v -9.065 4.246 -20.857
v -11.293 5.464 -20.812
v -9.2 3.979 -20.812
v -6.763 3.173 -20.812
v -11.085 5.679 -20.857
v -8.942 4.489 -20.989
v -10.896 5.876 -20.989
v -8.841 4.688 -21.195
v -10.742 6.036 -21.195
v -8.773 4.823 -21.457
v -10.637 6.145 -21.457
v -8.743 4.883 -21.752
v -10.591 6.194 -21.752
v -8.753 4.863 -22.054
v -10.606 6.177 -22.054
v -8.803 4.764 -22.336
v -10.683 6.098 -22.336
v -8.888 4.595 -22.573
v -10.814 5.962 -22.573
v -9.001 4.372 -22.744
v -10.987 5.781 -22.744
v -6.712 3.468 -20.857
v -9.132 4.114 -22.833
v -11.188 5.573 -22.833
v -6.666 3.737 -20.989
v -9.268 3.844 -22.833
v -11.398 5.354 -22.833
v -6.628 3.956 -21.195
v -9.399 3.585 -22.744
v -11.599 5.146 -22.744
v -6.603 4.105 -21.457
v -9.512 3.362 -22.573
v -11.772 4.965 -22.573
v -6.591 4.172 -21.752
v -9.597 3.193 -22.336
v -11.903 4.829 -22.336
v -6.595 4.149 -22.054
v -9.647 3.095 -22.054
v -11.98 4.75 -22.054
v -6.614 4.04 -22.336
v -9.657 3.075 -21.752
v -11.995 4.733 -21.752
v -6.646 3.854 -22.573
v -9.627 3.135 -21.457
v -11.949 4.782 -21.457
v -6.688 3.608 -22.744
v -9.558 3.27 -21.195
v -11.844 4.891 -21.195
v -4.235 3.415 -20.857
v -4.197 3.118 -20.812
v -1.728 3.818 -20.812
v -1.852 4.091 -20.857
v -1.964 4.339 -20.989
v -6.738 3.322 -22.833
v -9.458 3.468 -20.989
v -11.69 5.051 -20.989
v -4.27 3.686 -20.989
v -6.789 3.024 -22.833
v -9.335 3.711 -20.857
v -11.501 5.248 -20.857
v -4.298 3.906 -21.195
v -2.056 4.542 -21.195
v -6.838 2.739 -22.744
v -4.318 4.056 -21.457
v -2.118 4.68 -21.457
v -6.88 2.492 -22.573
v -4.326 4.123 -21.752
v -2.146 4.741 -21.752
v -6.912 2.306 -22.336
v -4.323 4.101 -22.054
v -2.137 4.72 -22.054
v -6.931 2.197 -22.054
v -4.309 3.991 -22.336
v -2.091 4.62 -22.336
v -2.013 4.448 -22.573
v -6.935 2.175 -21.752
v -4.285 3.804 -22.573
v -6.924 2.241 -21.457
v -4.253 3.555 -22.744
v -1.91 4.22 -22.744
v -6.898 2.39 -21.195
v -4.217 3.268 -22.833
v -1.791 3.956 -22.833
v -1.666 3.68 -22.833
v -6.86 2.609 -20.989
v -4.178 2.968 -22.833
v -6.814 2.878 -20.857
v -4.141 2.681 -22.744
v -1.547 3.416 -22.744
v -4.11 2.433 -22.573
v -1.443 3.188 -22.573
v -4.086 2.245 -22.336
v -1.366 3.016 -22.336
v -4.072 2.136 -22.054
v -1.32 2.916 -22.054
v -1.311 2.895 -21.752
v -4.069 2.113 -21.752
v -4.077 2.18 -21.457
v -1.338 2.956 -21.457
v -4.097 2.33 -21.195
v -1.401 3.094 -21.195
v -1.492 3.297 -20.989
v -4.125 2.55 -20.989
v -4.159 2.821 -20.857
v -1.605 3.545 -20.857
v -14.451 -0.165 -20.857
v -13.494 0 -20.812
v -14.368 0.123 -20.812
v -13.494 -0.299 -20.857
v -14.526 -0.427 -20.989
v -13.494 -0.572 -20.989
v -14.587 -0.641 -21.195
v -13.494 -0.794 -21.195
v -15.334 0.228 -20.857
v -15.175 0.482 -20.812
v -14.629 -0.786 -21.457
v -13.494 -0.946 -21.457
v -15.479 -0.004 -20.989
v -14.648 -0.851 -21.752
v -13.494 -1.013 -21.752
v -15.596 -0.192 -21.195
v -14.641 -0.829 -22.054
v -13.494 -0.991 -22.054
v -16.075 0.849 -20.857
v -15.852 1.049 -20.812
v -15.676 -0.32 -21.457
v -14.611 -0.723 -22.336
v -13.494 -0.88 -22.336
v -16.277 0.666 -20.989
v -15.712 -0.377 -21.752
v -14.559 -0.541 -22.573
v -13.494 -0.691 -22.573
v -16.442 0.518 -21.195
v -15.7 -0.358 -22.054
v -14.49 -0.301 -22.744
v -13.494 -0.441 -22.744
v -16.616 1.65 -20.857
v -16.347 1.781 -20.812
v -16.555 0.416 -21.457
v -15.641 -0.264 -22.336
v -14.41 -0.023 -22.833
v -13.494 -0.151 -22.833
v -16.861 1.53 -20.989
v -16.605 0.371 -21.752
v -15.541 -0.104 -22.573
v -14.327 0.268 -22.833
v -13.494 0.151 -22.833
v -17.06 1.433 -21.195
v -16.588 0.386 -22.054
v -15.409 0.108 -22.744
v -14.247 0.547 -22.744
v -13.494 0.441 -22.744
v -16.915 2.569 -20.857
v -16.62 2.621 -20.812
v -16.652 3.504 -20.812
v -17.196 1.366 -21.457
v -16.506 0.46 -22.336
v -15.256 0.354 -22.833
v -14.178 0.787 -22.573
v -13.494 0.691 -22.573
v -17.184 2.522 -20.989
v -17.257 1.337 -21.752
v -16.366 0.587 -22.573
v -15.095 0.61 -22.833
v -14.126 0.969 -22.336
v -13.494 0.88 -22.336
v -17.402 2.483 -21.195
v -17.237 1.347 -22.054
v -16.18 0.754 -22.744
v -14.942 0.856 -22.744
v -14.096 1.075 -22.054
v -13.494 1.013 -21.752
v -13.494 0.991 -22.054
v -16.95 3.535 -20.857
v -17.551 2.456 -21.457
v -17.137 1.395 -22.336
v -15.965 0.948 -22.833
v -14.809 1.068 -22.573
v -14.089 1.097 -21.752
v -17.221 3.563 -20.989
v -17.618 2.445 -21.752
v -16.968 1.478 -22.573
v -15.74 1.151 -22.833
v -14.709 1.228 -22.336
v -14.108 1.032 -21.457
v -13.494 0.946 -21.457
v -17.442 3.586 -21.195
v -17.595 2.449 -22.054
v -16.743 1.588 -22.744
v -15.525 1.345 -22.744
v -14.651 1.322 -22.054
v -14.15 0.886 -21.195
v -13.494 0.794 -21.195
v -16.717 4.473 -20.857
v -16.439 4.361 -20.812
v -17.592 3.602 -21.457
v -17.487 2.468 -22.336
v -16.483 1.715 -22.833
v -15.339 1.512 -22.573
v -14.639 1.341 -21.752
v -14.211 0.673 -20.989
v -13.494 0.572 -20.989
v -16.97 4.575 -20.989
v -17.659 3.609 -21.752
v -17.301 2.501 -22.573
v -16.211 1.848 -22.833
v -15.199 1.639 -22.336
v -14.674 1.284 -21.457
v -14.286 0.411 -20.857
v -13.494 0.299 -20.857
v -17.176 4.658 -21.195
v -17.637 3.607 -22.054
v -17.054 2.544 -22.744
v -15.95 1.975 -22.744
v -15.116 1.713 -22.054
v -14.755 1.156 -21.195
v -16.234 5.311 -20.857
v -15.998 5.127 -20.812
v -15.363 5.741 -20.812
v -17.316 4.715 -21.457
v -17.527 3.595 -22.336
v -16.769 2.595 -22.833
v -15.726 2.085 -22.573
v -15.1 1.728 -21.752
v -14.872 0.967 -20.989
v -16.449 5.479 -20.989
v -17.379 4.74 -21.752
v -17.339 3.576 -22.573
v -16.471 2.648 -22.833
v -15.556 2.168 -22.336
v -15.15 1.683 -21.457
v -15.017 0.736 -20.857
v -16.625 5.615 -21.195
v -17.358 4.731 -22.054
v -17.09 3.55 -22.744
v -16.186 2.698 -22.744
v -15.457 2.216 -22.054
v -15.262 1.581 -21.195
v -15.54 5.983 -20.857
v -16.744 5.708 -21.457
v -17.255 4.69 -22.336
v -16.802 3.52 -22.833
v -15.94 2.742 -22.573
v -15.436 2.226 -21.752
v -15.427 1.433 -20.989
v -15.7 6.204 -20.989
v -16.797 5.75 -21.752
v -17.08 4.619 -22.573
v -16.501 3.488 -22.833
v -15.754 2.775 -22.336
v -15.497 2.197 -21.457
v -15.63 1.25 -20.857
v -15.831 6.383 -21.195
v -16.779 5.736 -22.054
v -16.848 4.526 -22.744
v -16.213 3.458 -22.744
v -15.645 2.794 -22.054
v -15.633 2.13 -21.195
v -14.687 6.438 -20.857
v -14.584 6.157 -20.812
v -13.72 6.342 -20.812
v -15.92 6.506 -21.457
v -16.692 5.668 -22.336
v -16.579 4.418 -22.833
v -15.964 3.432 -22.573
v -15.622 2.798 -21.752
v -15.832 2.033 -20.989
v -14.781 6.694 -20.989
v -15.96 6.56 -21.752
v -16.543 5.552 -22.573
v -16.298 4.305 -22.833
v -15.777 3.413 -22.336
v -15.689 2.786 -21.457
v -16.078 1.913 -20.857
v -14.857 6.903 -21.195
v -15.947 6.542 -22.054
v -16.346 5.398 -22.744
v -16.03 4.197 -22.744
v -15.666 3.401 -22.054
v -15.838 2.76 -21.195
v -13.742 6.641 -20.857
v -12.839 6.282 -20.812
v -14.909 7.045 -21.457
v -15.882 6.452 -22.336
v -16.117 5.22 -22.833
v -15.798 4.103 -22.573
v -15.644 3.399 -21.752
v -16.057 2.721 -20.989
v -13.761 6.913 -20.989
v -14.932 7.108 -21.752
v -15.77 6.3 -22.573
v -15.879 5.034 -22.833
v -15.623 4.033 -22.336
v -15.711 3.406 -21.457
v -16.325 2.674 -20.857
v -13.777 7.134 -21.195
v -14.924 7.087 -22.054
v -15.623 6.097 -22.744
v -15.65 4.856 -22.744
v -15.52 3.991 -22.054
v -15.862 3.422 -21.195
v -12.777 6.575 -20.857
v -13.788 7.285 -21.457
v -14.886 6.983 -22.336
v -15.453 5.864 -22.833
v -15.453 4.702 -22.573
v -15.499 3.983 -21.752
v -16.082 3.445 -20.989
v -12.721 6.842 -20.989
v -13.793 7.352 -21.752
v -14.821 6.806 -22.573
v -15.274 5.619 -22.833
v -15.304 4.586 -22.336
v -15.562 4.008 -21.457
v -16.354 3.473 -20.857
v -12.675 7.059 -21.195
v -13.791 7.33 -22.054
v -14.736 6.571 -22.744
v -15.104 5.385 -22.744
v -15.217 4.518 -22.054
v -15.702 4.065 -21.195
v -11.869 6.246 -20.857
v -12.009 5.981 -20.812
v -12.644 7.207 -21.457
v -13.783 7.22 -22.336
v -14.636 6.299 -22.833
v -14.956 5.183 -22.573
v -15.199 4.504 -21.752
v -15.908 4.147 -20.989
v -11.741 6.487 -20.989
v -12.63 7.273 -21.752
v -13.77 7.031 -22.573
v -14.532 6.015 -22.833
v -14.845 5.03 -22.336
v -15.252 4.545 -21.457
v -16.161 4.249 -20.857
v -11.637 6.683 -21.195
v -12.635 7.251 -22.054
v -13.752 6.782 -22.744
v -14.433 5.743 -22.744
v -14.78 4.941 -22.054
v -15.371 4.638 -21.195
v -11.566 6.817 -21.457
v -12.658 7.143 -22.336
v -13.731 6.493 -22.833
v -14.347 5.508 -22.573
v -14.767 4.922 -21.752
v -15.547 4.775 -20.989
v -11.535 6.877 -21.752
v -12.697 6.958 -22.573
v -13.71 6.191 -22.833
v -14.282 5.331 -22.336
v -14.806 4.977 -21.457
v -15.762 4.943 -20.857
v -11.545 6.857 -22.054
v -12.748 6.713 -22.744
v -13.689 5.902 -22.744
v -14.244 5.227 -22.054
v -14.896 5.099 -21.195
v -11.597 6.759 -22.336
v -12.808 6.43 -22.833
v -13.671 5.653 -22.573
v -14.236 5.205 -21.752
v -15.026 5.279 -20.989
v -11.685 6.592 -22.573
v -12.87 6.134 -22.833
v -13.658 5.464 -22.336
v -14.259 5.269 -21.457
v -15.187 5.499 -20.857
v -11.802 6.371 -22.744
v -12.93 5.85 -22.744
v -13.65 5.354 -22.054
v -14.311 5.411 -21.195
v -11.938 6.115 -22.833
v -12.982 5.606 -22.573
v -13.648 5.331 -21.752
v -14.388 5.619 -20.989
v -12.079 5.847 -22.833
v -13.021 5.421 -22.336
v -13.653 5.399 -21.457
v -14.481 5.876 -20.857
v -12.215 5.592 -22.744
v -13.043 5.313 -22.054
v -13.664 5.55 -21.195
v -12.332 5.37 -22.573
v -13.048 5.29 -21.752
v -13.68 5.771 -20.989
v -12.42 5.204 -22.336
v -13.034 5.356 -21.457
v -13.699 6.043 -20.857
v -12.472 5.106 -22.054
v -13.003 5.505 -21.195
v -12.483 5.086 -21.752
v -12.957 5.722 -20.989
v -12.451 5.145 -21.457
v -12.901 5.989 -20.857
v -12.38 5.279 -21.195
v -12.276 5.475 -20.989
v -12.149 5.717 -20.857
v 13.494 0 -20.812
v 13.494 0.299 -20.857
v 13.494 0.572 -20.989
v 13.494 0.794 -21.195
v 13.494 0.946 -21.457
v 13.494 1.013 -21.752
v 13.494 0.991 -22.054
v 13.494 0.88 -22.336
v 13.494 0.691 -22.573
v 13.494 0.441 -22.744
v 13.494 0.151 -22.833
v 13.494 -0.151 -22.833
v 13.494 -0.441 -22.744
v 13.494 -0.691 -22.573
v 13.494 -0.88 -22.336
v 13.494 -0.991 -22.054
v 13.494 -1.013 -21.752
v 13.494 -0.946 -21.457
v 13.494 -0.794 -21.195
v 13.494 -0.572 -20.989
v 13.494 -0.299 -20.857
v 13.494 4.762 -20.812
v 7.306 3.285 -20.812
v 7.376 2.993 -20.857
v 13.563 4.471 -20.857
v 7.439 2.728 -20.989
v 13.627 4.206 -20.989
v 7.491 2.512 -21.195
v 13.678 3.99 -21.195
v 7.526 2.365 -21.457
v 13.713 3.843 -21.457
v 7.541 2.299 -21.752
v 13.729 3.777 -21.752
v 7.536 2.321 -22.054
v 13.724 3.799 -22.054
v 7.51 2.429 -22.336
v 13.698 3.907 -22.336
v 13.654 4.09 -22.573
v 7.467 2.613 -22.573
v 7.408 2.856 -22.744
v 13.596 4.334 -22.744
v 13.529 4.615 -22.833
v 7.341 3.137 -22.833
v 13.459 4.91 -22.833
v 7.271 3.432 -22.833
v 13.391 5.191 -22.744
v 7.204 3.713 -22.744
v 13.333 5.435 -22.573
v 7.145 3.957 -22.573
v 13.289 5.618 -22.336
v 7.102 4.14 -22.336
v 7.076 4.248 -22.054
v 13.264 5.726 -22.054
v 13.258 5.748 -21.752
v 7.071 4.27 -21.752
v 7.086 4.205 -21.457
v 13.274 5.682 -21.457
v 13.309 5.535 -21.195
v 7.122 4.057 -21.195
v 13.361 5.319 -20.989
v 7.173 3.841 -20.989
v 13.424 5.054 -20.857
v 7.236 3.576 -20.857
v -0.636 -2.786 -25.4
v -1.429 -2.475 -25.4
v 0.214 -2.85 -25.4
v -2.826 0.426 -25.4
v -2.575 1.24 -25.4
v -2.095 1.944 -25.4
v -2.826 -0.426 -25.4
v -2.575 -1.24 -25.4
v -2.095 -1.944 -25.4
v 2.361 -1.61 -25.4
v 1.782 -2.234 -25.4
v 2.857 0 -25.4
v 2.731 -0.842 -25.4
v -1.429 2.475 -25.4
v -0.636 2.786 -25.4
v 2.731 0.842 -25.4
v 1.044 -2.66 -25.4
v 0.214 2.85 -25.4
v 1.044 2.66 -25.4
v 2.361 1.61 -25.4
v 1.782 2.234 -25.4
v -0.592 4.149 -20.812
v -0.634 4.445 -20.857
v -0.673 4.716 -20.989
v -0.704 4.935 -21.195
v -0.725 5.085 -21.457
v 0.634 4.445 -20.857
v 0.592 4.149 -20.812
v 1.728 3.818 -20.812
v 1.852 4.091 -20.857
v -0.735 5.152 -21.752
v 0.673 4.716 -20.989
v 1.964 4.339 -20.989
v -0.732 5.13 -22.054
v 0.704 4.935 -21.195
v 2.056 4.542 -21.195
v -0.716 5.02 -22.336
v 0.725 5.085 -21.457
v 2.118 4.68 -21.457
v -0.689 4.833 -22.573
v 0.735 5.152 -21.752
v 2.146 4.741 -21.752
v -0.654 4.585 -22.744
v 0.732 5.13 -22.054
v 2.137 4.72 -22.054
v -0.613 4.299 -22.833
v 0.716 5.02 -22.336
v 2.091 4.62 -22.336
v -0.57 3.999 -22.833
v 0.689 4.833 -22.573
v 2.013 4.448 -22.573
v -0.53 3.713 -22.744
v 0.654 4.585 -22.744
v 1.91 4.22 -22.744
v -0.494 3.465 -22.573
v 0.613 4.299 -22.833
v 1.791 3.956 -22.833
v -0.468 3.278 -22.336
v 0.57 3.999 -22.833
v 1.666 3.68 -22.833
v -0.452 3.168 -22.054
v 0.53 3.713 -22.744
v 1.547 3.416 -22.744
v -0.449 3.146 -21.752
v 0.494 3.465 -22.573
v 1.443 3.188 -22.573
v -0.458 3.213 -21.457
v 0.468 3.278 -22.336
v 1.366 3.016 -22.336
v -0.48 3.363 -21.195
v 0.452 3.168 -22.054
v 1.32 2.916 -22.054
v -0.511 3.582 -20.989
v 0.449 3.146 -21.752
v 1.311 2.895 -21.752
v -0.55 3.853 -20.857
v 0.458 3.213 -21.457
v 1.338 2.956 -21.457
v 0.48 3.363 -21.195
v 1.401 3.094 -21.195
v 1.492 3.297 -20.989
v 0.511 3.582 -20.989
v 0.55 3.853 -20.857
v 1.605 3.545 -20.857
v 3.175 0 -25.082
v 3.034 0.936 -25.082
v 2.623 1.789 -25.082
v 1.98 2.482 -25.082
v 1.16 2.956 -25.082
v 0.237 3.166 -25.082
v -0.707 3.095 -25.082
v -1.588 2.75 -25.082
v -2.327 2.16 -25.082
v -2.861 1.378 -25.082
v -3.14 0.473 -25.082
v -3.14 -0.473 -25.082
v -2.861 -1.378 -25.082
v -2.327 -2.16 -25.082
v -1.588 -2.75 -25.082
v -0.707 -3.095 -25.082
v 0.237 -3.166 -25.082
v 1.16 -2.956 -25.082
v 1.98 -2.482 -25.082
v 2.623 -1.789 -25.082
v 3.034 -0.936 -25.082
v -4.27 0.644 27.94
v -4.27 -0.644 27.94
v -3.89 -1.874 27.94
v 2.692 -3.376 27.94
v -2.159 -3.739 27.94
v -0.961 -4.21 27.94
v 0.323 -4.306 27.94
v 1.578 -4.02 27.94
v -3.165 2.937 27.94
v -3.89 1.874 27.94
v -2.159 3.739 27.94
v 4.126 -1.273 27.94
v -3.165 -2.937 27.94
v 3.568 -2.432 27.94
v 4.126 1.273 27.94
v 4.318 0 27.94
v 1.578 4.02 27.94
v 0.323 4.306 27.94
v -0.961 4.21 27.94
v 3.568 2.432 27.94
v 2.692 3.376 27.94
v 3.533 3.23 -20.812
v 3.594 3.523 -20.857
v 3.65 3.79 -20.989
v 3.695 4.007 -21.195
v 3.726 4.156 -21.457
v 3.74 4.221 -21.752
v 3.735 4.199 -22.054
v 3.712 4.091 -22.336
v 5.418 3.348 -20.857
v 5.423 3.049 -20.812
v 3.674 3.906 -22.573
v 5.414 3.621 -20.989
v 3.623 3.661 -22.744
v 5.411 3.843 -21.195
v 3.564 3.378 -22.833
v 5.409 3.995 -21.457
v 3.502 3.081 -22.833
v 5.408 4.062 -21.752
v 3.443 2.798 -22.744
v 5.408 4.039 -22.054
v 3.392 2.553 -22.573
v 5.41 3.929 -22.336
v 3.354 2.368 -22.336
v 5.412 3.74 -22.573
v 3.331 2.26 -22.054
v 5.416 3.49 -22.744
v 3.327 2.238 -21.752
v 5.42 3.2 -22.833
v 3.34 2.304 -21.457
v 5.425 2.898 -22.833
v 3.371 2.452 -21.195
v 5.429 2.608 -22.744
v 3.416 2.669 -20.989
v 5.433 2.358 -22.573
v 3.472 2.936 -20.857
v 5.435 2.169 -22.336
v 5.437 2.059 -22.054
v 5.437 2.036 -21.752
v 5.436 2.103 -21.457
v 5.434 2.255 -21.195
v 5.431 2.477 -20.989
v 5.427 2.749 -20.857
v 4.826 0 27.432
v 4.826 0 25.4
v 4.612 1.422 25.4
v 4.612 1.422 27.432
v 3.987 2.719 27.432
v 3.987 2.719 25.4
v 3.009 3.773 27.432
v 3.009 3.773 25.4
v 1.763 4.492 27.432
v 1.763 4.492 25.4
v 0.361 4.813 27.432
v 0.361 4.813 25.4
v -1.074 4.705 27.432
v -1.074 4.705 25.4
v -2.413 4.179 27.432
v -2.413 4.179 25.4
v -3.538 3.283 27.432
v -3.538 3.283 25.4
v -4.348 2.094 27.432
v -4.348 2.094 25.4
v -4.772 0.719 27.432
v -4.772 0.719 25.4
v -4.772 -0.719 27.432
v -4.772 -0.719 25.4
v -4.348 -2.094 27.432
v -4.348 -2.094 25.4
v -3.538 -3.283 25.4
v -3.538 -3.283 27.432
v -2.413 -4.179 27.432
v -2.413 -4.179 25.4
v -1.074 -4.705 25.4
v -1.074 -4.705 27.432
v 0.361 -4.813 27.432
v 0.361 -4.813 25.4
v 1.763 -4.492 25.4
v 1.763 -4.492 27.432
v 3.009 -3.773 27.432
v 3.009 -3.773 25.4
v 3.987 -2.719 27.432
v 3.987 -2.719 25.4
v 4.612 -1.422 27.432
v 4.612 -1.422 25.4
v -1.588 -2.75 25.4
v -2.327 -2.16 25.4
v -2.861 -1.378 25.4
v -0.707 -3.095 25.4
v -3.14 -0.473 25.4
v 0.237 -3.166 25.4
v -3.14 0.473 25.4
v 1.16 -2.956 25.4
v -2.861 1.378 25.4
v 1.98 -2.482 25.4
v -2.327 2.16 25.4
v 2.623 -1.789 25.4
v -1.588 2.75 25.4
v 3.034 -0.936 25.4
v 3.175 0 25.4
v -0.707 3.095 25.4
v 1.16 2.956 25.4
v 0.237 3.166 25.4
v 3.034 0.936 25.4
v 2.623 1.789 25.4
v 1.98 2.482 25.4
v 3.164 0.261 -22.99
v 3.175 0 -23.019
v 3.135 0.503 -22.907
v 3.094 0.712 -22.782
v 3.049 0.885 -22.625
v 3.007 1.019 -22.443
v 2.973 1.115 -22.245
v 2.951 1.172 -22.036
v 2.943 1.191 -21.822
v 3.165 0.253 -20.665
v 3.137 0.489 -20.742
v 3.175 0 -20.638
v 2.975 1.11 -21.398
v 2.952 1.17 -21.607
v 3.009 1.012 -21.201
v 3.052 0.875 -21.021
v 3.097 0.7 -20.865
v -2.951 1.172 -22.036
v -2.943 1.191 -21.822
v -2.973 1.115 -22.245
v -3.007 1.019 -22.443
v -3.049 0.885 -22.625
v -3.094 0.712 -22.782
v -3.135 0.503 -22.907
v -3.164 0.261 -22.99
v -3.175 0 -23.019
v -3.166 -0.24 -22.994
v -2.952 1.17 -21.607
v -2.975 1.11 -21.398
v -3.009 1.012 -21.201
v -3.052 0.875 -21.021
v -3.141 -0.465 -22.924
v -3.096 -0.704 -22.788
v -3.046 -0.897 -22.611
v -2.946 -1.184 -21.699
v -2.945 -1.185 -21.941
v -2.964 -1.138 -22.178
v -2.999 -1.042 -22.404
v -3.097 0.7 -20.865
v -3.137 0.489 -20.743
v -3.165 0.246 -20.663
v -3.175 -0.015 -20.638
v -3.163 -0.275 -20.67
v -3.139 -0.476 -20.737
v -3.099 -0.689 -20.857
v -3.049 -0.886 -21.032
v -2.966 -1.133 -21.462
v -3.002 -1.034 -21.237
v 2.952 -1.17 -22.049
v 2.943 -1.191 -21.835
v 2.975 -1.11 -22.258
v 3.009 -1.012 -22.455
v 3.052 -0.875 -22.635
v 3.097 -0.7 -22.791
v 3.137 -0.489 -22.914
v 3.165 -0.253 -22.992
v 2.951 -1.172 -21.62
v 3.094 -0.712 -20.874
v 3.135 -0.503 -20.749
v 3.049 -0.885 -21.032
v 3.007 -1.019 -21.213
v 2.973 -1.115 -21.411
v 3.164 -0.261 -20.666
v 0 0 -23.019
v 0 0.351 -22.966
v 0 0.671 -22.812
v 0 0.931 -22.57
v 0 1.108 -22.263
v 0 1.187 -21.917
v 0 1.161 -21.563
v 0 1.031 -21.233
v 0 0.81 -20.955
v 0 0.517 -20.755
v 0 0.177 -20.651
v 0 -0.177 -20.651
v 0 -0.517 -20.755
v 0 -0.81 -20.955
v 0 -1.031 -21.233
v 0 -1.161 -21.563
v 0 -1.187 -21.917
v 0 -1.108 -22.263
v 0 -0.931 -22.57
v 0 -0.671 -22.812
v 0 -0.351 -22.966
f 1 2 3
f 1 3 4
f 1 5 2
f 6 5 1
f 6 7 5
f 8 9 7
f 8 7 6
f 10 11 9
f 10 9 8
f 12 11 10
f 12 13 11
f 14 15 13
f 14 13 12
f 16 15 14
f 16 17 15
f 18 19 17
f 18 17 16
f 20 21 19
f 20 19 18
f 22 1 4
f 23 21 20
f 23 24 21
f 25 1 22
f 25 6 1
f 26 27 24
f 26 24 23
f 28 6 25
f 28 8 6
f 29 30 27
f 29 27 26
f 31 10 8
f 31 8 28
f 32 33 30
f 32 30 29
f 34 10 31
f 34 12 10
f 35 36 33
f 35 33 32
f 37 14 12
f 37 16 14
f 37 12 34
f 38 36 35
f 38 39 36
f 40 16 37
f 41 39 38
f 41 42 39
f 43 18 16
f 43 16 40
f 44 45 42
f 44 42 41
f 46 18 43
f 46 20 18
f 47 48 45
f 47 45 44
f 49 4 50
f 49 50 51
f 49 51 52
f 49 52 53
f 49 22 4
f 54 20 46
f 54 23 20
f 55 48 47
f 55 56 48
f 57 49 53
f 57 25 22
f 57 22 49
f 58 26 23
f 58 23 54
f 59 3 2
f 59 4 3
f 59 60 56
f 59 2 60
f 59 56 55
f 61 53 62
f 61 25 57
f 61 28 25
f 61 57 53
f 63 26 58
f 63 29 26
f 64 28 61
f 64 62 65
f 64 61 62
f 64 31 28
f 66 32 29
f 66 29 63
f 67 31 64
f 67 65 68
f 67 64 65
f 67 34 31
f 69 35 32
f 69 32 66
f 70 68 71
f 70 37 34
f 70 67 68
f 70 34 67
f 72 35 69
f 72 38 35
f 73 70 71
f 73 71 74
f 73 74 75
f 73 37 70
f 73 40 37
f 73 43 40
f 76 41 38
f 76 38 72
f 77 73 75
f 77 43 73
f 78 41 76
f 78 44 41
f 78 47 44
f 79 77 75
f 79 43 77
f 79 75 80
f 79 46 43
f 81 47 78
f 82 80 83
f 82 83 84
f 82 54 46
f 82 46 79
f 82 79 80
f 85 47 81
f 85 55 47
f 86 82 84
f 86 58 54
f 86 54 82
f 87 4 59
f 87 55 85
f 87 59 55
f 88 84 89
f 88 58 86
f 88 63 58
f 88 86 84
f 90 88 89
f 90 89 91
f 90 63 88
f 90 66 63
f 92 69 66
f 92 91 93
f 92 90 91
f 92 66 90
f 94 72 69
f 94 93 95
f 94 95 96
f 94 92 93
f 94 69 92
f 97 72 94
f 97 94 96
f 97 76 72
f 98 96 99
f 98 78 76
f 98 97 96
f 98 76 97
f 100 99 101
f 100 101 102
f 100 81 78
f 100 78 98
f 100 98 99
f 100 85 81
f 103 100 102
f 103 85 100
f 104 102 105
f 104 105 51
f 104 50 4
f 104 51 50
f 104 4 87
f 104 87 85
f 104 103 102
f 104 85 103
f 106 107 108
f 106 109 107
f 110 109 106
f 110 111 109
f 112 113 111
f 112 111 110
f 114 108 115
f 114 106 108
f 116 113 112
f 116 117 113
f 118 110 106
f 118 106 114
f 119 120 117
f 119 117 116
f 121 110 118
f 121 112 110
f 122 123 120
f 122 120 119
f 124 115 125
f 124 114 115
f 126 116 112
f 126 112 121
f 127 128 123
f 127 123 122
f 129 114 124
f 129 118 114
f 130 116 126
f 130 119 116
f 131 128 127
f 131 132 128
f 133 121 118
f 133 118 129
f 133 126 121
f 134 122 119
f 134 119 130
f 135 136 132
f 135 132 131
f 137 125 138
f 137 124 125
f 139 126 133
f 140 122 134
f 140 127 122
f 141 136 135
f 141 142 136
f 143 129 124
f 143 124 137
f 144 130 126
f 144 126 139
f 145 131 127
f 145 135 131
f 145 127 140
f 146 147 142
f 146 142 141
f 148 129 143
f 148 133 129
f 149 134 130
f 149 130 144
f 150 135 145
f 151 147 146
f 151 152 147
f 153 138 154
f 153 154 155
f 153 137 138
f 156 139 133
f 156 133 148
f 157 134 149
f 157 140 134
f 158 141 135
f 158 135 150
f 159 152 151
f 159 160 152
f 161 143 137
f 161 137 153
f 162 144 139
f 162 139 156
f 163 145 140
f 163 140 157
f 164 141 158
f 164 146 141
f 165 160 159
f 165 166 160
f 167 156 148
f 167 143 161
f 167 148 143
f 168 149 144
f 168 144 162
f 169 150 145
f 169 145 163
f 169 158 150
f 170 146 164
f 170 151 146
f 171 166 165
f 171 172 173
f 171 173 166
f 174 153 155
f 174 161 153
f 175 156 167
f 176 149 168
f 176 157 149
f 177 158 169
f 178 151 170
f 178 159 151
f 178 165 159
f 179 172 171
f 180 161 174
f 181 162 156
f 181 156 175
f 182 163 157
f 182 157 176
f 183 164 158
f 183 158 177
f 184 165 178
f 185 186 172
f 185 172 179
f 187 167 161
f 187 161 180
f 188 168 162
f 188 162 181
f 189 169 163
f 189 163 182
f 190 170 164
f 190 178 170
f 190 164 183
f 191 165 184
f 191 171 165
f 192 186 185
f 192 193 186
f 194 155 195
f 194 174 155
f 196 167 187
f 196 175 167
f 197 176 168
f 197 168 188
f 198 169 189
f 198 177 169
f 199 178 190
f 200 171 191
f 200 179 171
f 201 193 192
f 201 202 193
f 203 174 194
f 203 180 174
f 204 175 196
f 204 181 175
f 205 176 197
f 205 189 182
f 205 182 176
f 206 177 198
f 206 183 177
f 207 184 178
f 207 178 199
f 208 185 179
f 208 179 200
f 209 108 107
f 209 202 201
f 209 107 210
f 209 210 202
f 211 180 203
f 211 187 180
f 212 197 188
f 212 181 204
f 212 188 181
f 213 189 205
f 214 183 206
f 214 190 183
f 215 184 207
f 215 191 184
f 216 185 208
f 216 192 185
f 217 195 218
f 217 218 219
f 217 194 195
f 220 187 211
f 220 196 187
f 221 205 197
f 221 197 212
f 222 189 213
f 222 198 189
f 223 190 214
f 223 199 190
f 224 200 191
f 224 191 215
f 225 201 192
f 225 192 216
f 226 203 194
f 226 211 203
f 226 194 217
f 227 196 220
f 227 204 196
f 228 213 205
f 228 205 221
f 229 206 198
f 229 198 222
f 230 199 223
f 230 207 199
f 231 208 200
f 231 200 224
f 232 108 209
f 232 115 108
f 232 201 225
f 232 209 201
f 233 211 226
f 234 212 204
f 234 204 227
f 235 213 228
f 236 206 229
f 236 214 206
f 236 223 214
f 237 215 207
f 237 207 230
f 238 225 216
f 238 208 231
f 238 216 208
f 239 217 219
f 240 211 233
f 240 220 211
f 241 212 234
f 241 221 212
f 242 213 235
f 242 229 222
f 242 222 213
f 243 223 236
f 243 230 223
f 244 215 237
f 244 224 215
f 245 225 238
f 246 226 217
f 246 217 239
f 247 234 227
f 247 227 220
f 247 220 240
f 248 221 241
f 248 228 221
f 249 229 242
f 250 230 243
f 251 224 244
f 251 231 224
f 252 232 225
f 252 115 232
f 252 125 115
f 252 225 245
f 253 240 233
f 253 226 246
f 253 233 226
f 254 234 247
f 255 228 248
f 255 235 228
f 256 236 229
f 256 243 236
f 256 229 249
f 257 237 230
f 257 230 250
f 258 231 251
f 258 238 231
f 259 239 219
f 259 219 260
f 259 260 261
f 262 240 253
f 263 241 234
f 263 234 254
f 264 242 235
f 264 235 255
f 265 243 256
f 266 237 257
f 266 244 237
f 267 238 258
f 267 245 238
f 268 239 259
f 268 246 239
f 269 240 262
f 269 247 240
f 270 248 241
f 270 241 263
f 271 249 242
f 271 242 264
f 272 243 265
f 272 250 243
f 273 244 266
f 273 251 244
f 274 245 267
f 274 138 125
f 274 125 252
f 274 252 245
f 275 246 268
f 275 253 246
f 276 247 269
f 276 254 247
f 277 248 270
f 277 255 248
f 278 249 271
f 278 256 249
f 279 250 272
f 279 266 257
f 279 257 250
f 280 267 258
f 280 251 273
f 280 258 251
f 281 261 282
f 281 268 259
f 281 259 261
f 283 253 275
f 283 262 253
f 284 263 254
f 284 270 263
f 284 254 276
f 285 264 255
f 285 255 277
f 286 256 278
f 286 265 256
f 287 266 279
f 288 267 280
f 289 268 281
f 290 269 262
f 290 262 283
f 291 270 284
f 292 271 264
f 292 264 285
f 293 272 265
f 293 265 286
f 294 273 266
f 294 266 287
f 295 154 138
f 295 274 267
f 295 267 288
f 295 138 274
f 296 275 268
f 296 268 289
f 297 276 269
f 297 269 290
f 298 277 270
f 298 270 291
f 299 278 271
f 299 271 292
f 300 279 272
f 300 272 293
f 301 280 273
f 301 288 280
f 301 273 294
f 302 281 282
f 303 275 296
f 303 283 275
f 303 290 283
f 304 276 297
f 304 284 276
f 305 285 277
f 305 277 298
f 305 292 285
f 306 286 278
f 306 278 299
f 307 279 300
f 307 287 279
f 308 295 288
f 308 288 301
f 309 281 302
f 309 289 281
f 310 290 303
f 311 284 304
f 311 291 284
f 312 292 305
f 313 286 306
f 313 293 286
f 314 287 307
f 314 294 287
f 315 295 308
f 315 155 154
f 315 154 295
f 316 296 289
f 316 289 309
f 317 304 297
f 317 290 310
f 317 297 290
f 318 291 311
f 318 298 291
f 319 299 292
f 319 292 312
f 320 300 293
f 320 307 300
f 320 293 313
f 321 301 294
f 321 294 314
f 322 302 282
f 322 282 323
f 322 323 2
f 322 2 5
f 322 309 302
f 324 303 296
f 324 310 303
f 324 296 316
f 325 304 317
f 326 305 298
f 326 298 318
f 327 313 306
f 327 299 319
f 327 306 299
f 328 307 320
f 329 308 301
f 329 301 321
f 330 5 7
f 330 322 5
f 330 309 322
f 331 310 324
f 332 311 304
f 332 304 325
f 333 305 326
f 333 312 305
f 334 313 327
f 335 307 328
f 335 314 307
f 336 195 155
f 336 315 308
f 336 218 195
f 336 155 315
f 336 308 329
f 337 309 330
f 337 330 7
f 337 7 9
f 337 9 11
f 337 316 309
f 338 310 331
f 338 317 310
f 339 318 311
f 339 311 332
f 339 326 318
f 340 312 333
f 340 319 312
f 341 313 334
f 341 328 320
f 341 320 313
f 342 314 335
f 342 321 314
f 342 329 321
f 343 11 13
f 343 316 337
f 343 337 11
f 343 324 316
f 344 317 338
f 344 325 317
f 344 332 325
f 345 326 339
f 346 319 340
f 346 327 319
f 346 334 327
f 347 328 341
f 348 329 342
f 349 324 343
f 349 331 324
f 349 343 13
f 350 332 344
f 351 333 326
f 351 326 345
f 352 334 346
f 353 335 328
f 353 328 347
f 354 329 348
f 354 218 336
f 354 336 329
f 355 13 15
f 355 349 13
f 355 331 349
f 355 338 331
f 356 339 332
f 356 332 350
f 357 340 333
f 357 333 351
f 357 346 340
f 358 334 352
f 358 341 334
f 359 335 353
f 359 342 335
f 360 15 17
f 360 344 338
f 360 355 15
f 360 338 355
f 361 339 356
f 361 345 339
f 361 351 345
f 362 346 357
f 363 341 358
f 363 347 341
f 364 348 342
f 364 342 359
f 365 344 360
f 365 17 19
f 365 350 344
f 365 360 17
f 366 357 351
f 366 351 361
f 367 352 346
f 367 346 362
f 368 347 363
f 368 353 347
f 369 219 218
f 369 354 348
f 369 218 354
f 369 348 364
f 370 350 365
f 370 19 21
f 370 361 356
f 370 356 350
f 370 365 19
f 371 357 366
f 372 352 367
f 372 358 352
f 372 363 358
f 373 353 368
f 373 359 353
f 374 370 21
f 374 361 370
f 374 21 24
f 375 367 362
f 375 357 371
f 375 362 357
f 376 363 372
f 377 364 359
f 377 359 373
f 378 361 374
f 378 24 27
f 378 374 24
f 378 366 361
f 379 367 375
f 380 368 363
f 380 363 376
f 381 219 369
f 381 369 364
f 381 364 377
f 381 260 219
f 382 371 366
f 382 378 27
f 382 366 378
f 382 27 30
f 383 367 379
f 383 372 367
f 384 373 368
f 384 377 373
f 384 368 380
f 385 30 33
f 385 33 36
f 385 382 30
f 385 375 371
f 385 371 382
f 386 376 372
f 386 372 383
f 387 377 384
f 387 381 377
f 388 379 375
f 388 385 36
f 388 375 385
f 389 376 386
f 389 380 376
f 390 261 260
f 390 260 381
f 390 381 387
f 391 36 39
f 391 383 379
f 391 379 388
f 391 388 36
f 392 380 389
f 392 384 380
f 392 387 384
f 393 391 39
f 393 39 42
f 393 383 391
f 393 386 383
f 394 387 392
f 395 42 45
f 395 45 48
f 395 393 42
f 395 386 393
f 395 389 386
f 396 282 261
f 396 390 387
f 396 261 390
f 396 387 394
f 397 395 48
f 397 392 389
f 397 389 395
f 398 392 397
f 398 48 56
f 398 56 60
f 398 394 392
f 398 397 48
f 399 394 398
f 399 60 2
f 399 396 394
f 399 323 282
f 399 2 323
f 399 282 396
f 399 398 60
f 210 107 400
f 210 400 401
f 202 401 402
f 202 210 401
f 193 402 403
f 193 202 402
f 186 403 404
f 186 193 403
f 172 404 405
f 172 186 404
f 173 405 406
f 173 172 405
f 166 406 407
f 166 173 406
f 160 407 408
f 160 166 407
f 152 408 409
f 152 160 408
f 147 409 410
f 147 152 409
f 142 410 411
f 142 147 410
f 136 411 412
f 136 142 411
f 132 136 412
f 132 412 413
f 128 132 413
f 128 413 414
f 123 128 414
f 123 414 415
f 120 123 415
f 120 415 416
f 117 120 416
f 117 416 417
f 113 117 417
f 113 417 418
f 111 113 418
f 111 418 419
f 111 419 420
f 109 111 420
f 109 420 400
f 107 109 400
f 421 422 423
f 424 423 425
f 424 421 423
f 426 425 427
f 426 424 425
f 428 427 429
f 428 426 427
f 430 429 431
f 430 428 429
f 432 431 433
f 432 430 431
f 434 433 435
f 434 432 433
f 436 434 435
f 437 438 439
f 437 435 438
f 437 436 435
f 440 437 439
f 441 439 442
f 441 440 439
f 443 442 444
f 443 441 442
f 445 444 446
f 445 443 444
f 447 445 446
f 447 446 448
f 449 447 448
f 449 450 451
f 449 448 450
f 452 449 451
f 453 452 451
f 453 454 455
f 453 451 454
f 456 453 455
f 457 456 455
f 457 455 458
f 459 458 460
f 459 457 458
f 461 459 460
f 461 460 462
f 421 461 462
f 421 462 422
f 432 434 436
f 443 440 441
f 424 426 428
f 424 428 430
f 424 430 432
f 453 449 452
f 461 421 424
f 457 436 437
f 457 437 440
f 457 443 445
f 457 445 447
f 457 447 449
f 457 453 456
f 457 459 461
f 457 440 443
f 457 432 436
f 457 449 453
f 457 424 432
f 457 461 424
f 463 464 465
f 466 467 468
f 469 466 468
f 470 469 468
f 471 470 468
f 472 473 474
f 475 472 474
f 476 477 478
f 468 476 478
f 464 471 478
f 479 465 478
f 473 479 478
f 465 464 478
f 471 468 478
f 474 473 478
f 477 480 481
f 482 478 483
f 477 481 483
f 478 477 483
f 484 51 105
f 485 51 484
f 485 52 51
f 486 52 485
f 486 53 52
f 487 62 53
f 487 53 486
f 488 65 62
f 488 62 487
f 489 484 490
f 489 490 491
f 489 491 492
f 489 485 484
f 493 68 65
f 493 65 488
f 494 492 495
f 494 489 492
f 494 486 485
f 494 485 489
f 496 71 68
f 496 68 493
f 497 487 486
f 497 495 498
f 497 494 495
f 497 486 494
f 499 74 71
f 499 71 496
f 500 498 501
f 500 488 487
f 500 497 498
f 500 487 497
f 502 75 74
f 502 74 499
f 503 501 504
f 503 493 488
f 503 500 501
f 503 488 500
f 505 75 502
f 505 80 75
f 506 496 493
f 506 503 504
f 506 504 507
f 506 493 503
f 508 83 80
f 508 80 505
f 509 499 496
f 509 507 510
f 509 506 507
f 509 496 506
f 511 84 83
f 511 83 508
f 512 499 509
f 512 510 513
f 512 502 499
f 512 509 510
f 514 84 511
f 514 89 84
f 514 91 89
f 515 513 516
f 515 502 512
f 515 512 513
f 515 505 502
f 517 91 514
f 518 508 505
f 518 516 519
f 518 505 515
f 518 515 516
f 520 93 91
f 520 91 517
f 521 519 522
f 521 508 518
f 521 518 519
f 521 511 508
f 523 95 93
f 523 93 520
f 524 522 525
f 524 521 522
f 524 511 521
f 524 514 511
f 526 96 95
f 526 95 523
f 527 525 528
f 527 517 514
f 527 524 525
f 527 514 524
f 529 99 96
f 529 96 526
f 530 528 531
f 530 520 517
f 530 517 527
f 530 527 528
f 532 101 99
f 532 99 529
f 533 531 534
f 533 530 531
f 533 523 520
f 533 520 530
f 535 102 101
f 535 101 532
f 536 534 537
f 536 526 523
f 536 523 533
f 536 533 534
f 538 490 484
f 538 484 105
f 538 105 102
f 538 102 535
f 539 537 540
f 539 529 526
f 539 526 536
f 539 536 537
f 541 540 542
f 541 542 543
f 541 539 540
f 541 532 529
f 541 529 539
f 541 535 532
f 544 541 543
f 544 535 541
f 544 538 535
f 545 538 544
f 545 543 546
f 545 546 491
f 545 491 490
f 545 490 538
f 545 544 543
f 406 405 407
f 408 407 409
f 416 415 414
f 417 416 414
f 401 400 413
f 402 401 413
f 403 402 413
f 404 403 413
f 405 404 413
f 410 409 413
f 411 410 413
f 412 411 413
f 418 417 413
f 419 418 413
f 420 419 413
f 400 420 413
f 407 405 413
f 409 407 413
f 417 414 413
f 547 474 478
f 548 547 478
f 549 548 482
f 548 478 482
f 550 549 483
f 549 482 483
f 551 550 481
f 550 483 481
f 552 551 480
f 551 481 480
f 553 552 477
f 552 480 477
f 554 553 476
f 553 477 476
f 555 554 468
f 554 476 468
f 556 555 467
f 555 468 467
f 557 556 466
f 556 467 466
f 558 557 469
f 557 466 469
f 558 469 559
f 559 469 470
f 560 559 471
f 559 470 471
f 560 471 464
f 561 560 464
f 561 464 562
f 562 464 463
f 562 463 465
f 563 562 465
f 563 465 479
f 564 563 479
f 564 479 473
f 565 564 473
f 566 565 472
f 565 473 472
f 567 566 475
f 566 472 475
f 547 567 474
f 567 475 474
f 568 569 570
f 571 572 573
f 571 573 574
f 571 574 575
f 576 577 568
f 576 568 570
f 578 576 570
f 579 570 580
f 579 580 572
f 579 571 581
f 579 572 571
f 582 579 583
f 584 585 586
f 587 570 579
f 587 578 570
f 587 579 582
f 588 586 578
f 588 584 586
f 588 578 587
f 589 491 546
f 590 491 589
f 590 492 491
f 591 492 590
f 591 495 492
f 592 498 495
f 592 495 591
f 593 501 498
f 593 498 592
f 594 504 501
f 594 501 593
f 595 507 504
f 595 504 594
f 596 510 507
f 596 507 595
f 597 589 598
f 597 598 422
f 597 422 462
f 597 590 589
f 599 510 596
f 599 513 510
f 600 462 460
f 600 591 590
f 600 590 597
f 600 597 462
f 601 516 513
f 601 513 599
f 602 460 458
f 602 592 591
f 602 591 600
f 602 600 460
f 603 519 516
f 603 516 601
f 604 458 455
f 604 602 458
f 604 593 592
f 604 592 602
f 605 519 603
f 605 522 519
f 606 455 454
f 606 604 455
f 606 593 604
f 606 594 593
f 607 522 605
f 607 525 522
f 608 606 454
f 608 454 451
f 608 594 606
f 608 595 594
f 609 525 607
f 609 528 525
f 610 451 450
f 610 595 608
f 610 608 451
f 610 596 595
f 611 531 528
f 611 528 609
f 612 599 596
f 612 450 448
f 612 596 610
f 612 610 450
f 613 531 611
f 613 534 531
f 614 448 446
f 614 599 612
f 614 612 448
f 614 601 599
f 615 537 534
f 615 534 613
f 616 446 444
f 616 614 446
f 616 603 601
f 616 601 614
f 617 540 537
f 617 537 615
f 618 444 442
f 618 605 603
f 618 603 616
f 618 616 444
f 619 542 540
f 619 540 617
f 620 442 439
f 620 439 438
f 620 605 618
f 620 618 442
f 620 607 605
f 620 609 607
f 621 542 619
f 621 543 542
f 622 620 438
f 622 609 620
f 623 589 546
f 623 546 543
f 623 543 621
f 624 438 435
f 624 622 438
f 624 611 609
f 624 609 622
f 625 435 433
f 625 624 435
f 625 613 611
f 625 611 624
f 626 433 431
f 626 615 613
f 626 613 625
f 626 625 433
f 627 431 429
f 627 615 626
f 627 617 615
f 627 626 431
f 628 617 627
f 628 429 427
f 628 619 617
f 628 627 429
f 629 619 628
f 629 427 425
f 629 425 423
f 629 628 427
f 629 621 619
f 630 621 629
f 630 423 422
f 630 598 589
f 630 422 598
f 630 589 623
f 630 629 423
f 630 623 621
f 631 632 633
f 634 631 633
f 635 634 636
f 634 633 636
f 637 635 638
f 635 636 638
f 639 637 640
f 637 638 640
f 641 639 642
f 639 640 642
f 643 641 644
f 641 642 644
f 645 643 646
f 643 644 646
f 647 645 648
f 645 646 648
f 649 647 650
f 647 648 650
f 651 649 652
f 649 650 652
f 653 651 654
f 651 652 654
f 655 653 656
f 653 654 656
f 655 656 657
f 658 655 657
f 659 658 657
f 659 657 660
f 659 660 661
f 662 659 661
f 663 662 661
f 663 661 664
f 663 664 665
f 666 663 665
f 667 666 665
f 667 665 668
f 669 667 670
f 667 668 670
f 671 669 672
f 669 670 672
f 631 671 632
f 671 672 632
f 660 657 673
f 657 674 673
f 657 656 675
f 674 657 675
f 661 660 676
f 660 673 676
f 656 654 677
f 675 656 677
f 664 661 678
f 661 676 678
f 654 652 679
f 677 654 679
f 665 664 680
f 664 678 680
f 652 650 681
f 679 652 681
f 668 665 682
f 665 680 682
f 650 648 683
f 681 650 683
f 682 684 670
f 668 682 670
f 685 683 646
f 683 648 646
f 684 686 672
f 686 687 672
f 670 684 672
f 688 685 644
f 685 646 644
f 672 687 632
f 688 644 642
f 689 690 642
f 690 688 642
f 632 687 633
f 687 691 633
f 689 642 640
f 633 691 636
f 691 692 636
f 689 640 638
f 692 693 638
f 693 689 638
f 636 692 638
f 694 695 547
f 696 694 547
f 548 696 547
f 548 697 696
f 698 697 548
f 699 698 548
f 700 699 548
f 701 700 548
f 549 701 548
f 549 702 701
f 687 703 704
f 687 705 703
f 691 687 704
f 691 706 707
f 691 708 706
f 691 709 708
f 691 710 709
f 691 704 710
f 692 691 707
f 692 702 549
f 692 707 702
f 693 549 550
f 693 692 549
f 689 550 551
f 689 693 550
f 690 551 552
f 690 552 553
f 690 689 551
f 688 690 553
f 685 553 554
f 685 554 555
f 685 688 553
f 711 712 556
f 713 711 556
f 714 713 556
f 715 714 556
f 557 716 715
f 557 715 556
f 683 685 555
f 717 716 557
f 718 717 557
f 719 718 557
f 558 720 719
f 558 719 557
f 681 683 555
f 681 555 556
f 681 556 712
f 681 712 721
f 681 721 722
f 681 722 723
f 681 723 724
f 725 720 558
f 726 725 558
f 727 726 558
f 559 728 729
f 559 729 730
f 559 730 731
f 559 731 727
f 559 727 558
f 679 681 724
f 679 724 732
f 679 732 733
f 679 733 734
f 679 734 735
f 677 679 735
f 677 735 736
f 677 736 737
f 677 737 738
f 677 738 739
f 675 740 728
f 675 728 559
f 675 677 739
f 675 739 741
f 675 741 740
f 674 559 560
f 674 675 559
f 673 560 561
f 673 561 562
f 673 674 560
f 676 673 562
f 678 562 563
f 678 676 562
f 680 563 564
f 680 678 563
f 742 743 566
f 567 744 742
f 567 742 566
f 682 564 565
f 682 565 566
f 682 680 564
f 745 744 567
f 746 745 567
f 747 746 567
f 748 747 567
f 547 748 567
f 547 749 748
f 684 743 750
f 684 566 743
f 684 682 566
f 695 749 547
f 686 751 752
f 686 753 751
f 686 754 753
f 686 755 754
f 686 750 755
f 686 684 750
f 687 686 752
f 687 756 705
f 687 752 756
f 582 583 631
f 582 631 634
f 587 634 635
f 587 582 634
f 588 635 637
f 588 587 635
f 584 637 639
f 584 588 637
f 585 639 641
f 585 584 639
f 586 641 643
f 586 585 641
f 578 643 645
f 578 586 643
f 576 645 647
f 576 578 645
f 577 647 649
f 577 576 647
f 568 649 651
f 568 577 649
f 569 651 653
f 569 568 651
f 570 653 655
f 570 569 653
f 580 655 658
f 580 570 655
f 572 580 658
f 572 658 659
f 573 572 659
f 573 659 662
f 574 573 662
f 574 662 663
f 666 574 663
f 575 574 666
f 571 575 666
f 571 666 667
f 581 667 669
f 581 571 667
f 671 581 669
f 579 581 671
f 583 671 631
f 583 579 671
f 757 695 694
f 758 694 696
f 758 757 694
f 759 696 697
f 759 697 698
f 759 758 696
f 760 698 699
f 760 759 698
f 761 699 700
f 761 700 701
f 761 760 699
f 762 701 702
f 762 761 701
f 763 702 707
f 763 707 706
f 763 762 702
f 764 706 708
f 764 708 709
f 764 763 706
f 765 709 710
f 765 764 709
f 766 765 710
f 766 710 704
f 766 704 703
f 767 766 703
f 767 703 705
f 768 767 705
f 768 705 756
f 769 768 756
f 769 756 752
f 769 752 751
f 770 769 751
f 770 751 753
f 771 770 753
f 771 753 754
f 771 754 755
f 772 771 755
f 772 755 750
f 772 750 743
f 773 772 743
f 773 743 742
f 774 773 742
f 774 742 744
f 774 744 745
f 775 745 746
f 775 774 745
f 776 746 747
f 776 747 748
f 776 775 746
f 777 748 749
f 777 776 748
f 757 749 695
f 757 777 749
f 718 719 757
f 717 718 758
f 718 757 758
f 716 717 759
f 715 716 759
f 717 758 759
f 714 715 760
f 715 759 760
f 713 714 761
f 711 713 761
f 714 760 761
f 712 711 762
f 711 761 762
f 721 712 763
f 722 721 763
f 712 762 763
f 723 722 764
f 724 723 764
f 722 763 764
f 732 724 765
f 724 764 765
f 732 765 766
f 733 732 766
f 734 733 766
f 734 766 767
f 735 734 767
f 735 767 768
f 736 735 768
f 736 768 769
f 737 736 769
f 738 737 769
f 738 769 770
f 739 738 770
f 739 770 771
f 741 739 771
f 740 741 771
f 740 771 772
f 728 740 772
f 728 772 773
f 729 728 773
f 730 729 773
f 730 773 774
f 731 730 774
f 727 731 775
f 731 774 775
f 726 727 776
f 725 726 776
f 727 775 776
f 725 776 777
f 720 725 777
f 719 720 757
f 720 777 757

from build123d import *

# Parameters (mm, degrees)
SKETCH1_R           = 3.175
EXTRUDE1_DEPTH      = 25.4
SKETCH2_R           = 4.826
EXTRUDE2_DEPTH      = 2.54
CHAMFER1_SIZE       = 0.508
SKETCH3_R           = 1.190625
EXTRUDE3_DEPTH      = 5.826
EXTRUDE3_DEPTH_BACK = 5.826
CHAMFER2_SIZE       = 0.3175
SKETCH7_R           = 1.016


with BuildPart() as part:
    # Sketch1 → Extrude1 (new body, symmetric)
    with BuildSketch(Plane.XY):
        Circle(SKETCH1_R)
    extrude(amount=EXTRUDE1_DEPTH, both=True)

    # Sketch2 → Extrude2 (add)
    with BuildSketch(Plane.XY.offset(25.4)):
        Circle(SKETCH2_R)
    extrude(amount=EXTRUDE2_DEPTH)

    # Chamfer1
    chamfer1_edges = [part.edges().sort_by_distance(p)[0] for p in [
        (-4.826, 0, 27.94),
    ]]
    chamfer(chamfer1_edges, length=CHAMFER1_SIZE)

    # Sketch3 → Extrude3 (cut, two sides)
    with BuildSketch(Plane(origin=(0, 0, 0), x_dir=(0, 0, -1), z_dir=(1, 0, 0))) as extrude3_sk:
        with Locations((21.828125, 0)):
            Circle(SKETCH3_R)
    extrude(amount=EXTRUDE3_DEPTH, mode=Mode.SUBTRACT)
    extrude(extrude3_sk.sketch, amount=-EXTRUDE3_DEPTH_BACK, mode=Mode.SUBTRACT)

    # Chamfer2
    chamfer2_edges = [part.edges().sort_by_distance(p)[0] for p in [
        (-3.175, 0, -25.4),
    ]]
    chamfer(chamfer2_edges, length=CHAMFER2_SIZE)


with BuildPart() as body_2:
    # Sweep1: sweep along a path in Sketch6
    with BuildLine(Plane.XY.offset(-21.828125)) as sweep1_path:
        Line((13.49375, 0), (-13.49375, 0))
        ThreePointArc((-13.49375, 0), (-16.438801729, 4.361294783), (-11.292994408, 5.463514764))
        ThreePointArc((-11.292994408, 5.463514764), (-6.763179694, 3.173261299), (-1.728419774, 3.817989796))
        ThreePointArc((-1.728419774, 3.817989796), (0, 4.191), (1.728419774, 3.817989796))
        ThreePointArc((1.728419774, 3.817989796), (4.472851559, 3.087280395), (7.306026778, 3.28466386))
        Line((7.306026778, 3.28466386), (13.49375, 4.7625))
    # Sketch7 → Sweep1 (sweep)
    with BuildSketch(Plane(origin=(13.49375, 0, -21.828125), x_dir=(0, 0, 1), z_dir=(-1, 0, 0))):
        Circle(SKETCH7_R)
    sweep(path=sweep1_path.line)


solid = Compound([part.part, body_2.part])
